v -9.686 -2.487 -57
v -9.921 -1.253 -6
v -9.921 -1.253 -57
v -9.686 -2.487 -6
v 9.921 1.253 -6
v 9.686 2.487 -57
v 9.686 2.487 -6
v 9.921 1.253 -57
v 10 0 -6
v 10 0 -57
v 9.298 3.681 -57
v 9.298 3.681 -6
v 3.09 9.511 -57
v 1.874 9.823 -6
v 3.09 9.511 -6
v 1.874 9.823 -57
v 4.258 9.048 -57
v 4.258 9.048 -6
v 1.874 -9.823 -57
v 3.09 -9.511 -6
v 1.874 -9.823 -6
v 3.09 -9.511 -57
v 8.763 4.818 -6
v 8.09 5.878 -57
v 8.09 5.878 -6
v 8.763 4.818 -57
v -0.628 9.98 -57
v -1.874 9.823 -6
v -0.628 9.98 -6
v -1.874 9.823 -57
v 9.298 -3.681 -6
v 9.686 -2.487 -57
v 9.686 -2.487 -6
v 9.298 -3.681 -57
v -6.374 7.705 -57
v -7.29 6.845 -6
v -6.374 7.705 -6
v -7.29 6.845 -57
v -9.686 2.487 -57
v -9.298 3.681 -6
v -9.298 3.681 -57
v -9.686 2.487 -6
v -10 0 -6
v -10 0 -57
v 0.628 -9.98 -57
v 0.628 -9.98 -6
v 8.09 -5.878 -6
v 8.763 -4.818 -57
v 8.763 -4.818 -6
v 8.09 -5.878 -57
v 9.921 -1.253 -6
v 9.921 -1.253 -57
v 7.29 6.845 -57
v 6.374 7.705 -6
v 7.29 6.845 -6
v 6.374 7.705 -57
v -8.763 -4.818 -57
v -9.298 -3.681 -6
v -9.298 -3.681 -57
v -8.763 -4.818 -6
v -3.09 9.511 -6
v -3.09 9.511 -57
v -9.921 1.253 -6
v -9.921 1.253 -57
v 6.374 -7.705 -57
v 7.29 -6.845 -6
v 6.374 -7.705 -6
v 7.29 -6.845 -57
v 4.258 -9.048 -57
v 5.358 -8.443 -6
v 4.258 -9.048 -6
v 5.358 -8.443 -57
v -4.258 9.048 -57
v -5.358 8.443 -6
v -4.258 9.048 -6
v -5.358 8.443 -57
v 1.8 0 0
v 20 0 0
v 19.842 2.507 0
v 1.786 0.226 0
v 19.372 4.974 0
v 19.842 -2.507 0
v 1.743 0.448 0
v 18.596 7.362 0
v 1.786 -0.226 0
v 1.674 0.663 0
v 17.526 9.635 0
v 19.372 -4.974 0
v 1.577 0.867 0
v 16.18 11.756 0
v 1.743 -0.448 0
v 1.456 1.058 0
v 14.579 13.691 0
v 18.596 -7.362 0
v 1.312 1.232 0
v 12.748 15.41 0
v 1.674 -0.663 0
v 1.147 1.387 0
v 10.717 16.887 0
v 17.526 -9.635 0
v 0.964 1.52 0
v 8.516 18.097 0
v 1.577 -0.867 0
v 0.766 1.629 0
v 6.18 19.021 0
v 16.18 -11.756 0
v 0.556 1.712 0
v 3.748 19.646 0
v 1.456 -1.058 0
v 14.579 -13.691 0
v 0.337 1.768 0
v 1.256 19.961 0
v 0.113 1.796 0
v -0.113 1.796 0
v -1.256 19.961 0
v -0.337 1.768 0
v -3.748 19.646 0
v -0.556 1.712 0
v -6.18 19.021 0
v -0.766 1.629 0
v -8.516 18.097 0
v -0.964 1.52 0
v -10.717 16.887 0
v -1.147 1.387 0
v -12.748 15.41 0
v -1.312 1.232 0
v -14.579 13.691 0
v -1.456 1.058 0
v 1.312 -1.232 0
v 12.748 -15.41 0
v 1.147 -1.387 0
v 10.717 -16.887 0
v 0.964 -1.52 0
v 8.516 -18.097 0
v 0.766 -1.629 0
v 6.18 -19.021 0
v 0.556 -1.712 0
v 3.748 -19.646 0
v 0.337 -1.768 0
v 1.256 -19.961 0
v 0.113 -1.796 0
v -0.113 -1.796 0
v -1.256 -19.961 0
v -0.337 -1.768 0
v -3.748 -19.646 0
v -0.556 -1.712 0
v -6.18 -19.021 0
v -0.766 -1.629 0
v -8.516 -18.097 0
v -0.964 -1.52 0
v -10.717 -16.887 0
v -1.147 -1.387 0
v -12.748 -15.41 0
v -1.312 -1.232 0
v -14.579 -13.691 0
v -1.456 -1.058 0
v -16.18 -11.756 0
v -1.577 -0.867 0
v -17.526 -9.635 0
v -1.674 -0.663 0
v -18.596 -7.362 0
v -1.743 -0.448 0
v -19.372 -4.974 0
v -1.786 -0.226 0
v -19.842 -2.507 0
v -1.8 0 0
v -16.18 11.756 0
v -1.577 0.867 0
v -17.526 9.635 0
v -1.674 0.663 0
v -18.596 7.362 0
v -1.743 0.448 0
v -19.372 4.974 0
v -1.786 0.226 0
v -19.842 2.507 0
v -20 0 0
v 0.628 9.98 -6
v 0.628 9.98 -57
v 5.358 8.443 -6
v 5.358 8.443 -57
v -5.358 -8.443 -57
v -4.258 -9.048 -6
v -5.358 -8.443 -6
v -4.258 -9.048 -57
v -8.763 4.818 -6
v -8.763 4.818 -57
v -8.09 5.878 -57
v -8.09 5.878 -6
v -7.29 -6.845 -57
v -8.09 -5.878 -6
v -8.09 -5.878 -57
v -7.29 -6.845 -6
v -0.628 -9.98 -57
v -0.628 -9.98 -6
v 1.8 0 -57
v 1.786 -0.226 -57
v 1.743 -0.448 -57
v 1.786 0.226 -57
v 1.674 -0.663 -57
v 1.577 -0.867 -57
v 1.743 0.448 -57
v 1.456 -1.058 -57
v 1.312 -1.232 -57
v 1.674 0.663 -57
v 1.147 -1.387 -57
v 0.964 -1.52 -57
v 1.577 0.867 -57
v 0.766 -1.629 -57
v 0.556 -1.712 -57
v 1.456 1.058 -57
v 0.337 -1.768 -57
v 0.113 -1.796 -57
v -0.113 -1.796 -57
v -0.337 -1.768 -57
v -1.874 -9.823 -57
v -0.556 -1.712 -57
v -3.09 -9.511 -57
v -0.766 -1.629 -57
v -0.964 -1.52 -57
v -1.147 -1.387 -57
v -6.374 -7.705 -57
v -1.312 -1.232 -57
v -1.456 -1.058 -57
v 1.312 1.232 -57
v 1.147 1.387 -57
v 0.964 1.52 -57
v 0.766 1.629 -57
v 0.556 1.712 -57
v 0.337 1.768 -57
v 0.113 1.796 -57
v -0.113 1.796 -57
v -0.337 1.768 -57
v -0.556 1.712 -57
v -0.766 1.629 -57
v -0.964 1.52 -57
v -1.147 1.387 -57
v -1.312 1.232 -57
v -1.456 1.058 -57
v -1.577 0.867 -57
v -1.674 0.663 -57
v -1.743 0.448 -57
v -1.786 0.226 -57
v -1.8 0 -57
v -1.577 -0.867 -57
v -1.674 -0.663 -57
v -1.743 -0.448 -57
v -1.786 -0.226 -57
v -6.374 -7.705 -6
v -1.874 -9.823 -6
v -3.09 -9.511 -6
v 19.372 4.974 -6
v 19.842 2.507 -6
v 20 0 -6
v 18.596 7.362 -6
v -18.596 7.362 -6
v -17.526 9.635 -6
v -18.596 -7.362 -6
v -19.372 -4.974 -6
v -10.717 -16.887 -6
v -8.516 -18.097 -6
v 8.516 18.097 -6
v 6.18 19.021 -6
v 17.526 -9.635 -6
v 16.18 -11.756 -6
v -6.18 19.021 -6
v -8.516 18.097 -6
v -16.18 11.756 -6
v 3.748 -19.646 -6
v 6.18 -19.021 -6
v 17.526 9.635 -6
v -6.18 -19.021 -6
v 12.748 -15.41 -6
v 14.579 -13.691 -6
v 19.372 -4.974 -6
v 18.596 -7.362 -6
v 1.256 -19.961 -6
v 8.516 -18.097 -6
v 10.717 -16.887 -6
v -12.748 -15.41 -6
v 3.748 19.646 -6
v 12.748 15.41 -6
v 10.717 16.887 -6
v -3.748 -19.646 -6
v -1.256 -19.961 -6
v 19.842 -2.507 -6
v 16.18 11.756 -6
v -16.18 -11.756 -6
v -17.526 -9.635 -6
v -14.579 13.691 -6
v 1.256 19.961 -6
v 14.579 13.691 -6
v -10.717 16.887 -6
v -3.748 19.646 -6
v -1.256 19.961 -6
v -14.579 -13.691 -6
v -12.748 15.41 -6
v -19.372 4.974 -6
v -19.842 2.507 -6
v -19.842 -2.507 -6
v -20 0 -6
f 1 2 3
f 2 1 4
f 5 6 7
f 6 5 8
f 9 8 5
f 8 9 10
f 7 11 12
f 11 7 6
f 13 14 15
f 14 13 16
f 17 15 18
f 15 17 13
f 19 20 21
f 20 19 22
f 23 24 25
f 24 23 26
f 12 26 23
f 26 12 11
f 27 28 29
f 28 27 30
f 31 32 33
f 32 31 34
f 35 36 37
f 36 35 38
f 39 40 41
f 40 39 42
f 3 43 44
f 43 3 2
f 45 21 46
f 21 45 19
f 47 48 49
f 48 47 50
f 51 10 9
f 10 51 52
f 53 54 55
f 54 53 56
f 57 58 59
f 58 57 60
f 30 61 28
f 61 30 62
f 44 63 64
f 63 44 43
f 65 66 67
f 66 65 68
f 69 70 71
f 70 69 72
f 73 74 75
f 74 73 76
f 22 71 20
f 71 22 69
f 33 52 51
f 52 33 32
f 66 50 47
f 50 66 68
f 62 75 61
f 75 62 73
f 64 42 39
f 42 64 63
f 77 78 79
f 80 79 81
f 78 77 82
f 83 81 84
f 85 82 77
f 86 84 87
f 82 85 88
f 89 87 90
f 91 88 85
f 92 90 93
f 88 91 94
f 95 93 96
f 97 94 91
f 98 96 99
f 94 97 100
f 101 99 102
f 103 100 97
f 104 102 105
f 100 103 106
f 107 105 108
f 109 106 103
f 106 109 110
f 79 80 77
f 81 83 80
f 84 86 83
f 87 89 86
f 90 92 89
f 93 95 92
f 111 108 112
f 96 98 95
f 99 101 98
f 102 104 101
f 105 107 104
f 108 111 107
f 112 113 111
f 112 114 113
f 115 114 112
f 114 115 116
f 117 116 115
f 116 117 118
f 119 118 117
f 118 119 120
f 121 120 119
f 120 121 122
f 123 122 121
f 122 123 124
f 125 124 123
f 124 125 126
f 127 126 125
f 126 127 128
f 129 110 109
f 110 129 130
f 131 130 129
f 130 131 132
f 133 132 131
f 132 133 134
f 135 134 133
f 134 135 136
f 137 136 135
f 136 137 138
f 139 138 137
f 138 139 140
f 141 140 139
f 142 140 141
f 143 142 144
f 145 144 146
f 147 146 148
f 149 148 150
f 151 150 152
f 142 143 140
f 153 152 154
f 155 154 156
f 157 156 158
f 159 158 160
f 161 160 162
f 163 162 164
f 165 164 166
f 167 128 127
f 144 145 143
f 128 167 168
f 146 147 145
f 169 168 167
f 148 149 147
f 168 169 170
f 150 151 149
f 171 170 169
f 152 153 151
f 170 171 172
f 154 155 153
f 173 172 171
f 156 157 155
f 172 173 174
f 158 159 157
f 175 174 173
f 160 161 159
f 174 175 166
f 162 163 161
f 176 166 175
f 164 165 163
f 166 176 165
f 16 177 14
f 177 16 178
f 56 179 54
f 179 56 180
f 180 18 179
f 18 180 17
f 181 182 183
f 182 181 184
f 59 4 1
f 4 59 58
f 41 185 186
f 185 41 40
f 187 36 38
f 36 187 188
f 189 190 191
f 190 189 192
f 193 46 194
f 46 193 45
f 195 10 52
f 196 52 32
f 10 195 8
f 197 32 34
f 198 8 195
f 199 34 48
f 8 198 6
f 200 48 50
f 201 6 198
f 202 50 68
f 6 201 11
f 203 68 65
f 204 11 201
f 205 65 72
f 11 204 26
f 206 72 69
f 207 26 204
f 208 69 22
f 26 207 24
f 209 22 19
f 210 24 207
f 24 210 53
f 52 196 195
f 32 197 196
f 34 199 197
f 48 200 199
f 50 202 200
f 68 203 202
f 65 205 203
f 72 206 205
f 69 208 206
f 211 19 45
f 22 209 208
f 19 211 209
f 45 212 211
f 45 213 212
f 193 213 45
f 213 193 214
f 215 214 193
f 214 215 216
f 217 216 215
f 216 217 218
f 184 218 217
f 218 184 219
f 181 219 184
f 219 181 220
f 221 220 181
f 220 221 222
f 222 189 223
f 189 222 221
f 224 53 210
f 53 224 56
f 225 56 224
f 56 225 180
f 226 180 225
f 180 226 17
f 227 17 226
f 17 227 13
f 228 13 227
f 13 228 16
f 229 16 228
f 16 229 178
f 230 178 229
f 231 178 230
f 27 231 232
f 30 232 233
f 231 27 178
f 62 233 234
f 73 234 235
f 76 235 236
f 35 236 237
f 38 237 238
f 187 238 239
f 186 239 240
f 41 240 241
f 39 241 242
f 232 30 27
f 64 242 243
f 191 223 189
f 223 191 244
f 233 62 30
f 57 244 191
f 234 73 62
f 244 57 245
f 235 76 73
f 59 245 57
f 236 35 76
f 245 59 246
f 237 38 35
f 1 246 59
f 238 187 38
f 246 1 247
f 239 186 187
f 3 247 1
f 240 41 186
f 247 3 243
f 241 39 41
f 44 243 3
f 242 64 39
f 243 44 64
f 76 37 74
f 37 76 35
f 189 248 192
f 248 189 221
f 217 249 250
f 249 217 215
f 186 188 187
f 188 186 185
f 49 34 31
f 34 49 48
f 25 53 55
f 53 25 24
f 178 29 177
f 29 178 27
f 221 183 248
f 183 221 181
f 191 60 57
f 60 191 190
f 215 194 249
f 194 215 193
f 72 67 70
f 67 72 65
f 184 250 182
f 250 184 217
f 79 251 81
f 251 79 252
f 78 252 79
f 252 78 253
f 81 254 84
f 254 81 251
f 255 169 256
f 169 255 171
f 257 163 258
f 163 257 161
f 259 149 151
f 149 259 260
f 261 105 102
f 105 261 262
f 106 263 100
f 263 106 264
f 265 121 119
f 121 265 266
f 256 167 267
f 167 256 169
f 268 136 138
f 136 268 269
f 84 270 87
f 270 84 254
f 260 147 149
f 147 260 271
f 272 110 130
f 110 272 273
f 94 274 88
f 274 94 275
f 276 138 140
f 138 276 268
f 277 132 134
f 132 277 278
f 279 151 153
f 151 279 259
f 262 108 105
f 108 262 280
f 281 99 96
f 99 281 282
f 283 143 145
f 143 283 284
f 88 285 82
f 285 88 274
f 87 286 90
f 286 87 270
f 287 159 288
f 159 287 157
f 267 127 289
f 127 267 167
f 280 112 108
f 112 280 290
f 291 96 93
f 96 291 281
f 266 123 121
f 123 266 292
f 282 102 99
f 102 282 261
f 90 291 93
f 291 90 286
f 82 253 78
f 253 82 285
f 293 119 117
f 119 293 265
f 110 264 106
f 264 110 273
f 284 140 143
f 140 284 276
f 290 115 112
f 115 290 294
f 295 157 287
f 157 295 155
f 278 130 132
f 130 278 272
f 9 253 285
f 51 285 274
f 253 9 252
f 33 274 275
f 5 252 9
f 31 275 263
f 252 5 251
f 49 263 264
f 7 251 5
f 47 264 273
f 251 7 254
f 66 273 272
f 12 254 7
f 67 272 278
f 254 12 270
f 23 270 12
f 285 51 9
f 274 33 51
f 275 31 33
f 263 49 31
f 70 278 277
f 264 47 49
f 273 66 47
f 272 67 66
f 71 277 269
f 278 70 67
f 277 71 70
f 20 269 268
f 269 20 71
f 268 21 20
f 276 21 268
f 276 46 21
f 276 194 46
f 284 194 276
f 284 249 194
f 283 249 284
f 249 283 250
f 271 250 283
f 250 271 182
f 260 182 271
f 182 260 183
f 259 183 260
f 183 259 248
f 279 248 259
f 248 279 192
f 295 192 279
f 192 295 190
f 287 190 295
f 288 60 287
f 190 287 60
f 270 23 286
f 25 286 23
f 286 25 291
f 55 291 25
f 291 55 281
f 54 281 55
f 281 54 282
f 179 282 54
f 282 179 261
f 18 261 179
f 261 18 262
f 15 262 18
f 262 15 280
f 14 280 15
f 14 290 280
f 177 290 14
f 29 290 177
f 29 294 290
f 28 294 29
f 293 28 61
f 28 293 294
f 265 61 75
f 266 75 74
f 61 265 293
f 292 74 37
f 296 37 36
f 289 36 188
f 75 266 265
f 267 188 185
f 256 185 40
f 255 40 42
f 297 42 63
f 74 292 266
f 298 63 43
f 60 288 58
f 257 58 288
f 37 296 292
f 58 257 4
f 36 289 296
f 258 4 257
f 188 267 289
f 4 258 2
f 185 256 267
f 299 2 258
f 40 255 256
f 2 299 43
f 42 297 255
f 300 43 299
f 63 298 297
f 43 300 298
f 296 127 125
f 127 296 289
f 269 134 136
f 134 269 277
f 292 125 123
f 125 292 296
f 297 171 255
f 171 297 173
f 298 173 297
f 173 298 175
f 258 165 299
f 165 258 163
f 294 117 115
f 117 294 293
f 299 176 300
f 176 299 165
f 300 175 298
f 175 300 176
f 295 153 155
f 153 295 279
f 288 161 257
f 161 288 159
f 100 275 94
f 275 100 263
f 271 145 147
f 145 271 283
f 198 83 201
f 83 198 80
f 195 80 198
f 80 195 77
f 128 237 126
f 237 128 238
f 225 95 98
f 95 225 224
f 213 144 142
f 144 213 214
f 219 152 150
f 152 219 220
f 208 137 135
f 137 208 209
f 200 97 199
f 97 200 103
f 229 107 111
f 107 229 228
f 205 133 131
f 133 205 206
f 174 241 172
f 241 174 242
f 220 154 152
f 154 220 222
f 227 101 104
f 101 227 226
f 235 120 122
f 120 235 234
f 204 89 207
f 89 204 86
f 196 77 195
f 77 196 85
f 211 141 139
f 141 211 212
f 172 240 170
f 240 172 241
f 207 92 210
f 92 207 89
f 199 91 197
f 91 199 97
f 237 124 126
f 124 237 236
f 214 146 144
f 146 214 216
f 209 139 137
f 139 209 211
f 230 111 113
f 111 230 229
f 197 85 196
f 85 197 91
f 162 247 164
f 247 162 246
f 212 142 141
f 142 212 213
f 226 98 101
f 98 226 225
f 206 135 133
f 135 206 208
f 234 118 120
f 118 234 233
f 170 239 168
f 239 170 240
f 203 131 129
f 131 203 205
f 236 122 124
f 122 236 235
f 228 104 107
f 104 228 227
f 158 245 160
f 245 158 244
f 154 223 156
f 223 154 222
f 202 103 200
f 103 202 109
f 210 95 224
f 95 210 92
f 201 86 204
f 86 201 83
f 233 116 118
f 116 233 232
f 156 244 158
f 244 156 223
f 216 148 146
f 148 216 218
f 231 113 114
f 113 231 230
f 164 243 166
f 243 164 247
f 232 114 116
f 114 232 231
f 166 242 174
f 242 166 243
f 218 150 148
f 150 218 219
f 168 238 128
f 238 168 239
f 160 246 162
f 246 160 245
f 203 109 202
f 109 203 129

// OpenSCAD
$fn = 50;


difference() {
	union() {
		translate(v = [0, 0, -57.0000000000]) {
			cylinder(h = 57, r = 10.0000000000);
		}
		translate(v = [0, 0, -6.0000000000]) {
			cylinder(h = 6, r = 20.0000000000);
		}
	}
	union() {
		#translate(v = [0, 0, -57]) {
			cylinder(h = 57, r = 1.8000000000);
		}
	}
}
